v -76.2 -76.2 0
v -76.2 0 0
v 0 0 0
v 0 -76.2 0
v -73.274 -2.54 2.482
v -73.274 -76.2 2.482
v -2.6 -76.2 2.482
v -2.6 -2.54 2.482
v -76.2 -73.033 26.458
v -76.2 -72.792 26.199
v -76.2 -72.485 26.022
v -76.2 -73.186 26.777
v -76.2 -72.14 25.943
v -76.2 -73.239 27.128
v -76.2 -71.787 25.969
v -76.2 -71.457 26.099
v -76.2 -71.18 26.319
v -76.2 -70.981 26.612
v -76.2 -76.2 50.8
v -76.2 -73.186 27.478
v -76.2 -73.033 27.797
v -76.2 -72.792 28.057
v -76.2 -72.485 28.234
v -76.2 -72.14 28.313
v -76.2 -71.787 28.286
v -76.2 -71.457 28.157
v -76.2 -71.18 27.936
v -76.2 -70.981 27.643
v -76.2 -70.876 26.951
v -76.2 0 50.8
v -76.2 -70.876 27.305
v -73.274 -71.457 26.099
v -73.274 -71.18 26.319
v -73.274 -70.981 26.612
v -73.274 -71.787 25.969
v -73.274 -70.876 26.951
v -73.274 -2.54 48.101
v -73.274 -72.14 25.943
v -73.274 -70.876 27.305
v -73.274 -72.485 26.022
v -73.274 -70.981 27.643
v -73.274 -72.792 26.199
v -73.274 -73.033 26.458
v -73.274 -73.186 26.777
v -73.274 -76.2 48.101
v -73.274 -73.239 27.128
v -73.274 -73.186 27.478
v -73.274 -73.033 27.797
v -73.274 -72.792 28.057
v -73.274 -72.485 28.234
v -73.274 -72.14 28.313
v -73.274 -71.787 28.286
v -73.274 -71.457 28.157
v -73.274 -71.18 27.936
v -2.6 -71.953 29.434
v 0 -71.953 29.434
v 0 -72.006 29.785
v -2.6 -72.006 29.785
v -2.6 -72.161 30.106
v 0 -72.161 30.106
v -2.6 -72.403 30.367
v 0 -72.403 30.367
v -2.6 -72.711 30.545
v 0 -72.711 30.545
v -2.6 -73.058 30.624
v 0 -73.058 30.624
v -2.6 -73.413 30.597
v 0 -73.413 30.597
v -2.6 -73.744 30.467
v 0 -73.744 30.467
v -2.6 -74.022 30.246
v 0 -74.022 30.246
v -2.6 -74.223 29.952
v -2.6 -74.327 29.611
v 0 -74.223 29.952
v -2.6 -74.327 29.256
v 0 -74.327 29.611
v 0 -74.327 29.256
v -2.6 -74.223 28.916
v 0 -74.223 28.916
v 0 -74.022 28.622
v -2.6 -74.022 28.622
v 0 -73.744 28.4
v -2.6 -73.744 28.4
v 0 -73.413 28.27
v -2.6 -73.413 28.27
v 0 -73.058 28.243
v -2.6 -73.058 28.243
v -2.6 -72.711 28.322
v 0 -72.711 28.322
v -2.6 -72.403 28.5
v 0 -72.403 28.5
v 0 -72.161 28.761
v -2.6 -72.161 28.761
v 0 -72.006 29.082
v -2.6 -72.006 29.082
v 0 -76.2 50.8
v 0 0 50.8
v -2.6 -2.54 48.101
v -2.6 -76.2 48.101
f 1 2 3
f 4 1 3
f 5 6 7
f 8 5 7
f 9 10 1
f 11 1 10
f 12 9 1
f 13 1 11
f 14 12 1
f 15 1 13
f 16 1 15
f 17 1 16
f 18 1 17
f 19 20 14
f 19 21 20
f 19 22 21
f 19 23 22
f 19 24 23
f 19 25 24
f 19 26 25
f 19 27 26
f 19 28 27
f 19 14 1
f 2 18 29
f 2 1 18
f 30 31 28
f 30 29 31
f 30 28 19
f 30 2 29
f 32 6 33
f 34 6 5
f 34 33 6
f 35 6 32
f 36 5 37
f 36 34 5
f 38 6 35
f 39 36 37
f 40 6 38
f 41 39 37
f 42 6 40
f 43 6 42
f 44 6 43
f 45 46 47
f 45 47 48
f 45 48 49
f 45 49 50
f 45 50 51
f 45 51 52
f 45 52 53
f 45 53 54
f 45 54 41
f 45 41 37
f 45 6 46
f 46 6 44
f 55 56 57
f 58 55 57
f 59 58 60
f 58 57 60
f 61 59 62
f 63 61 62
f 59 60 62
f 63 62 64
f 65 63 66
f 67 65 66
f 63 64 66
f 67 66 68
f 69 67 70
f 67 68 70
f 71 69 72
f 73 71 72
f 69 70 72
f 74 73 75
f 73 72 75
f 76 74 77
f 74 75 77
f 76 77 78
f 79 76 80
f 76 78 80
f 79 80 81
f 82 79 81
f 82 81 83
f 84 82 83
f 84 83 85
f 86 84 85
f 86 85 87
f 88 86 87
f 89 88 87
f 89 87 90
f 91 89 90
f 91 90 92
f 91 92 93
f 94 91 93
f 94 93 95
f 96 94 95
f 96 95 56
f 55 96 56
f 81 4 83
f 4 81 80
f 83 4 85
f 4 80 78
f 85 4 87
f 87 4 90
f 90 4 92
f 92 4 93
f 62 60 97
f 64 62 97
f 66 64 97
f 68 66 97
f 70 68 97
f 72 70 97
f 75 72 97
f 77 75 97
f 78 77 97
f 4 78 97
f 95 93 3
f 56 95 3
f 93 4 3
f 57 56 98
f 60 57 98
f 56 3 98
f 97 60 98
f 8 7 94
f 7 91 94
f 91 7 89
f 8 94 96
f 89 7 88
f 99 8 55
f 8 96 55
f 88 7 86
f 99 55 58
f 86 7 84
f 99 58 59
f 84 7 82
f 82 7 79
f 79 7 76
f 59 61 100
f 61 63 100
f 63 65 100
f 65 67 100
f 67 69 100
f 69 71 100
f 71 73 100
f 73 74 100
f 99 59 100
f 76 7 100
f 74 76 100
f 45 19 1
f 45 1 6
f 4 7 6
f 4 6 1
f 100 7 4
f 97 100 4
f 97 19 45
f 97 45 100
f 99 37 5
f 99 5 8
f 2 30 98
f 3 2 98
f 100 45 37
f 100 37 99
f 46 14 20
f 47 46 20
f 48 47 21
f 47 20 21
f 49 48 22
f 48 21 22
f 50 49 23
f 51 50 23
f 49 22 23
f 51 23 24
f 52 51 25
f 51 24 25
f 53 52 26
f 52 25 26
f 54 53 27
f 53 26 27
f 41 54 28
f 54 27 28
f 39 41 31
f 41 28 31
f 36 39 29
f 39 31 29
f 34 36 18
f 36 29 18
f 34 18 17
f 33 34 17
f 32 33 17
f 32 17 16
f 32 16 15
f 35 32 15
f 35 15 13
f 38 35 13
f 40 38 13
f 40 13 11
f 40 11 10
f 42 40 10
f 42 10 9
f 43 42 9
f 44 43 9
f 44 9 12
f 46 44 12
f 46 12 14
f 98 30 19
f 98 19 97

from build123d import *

# Parameters (mm, degrees)
F0_W     = 76.2
F0_H     = 50.8
F1_DEPTH = 76.2
F2_W     = 70.673531
F2_H     = 45.6187
F3_DEPTH = 73.66
F4_R     = 1.188215
F5_DEPTH = 5.08
F6_R     = 1.1938
F7_DEPTH = 5.08


with BuildPart() as f1:
    # F0 (on Front) → F1 (new body)
    with BuildSketch(Plane.XZ):
        with Locations((-38.1, 25.4)):
            Rectangle(F0_W, F0_H)
    extrude(amount=F1_DEPTH)

    # F2 (on face) → F3 (cut)
    with BuildSketch(Plane.XZ.offset(76.2)):
        with Locations((-37.936796, 25.291196)):
            Rectangle(F2_W, F2_H)
    extrude(amount=-F3_DEPTH, mode=Mode.SUBTRACT)

    # F4 (on face) → F5 (cut)
    with BuildSketch(Plane(origin=(-76.2, 0, 0), x_dir=(0, -1, 0), z_dir=(-1, 0, 0))):
        with Locations((72.051063, 27.127683)):
            Circle(F4_R)
    extrude(amount=-F5_DEPTH, mode=Mode.SUBTRACT)

    # F6 (on face) → F7 (cut)
    with BuildSketch(Plane.YZ):
        with Locations((-73.146977, 29.433548)):
            Circle(F6_R)
    extrude(amount=-F7_DEPTH, mode=Mode.SUBTRACT)


solid = f1.part
